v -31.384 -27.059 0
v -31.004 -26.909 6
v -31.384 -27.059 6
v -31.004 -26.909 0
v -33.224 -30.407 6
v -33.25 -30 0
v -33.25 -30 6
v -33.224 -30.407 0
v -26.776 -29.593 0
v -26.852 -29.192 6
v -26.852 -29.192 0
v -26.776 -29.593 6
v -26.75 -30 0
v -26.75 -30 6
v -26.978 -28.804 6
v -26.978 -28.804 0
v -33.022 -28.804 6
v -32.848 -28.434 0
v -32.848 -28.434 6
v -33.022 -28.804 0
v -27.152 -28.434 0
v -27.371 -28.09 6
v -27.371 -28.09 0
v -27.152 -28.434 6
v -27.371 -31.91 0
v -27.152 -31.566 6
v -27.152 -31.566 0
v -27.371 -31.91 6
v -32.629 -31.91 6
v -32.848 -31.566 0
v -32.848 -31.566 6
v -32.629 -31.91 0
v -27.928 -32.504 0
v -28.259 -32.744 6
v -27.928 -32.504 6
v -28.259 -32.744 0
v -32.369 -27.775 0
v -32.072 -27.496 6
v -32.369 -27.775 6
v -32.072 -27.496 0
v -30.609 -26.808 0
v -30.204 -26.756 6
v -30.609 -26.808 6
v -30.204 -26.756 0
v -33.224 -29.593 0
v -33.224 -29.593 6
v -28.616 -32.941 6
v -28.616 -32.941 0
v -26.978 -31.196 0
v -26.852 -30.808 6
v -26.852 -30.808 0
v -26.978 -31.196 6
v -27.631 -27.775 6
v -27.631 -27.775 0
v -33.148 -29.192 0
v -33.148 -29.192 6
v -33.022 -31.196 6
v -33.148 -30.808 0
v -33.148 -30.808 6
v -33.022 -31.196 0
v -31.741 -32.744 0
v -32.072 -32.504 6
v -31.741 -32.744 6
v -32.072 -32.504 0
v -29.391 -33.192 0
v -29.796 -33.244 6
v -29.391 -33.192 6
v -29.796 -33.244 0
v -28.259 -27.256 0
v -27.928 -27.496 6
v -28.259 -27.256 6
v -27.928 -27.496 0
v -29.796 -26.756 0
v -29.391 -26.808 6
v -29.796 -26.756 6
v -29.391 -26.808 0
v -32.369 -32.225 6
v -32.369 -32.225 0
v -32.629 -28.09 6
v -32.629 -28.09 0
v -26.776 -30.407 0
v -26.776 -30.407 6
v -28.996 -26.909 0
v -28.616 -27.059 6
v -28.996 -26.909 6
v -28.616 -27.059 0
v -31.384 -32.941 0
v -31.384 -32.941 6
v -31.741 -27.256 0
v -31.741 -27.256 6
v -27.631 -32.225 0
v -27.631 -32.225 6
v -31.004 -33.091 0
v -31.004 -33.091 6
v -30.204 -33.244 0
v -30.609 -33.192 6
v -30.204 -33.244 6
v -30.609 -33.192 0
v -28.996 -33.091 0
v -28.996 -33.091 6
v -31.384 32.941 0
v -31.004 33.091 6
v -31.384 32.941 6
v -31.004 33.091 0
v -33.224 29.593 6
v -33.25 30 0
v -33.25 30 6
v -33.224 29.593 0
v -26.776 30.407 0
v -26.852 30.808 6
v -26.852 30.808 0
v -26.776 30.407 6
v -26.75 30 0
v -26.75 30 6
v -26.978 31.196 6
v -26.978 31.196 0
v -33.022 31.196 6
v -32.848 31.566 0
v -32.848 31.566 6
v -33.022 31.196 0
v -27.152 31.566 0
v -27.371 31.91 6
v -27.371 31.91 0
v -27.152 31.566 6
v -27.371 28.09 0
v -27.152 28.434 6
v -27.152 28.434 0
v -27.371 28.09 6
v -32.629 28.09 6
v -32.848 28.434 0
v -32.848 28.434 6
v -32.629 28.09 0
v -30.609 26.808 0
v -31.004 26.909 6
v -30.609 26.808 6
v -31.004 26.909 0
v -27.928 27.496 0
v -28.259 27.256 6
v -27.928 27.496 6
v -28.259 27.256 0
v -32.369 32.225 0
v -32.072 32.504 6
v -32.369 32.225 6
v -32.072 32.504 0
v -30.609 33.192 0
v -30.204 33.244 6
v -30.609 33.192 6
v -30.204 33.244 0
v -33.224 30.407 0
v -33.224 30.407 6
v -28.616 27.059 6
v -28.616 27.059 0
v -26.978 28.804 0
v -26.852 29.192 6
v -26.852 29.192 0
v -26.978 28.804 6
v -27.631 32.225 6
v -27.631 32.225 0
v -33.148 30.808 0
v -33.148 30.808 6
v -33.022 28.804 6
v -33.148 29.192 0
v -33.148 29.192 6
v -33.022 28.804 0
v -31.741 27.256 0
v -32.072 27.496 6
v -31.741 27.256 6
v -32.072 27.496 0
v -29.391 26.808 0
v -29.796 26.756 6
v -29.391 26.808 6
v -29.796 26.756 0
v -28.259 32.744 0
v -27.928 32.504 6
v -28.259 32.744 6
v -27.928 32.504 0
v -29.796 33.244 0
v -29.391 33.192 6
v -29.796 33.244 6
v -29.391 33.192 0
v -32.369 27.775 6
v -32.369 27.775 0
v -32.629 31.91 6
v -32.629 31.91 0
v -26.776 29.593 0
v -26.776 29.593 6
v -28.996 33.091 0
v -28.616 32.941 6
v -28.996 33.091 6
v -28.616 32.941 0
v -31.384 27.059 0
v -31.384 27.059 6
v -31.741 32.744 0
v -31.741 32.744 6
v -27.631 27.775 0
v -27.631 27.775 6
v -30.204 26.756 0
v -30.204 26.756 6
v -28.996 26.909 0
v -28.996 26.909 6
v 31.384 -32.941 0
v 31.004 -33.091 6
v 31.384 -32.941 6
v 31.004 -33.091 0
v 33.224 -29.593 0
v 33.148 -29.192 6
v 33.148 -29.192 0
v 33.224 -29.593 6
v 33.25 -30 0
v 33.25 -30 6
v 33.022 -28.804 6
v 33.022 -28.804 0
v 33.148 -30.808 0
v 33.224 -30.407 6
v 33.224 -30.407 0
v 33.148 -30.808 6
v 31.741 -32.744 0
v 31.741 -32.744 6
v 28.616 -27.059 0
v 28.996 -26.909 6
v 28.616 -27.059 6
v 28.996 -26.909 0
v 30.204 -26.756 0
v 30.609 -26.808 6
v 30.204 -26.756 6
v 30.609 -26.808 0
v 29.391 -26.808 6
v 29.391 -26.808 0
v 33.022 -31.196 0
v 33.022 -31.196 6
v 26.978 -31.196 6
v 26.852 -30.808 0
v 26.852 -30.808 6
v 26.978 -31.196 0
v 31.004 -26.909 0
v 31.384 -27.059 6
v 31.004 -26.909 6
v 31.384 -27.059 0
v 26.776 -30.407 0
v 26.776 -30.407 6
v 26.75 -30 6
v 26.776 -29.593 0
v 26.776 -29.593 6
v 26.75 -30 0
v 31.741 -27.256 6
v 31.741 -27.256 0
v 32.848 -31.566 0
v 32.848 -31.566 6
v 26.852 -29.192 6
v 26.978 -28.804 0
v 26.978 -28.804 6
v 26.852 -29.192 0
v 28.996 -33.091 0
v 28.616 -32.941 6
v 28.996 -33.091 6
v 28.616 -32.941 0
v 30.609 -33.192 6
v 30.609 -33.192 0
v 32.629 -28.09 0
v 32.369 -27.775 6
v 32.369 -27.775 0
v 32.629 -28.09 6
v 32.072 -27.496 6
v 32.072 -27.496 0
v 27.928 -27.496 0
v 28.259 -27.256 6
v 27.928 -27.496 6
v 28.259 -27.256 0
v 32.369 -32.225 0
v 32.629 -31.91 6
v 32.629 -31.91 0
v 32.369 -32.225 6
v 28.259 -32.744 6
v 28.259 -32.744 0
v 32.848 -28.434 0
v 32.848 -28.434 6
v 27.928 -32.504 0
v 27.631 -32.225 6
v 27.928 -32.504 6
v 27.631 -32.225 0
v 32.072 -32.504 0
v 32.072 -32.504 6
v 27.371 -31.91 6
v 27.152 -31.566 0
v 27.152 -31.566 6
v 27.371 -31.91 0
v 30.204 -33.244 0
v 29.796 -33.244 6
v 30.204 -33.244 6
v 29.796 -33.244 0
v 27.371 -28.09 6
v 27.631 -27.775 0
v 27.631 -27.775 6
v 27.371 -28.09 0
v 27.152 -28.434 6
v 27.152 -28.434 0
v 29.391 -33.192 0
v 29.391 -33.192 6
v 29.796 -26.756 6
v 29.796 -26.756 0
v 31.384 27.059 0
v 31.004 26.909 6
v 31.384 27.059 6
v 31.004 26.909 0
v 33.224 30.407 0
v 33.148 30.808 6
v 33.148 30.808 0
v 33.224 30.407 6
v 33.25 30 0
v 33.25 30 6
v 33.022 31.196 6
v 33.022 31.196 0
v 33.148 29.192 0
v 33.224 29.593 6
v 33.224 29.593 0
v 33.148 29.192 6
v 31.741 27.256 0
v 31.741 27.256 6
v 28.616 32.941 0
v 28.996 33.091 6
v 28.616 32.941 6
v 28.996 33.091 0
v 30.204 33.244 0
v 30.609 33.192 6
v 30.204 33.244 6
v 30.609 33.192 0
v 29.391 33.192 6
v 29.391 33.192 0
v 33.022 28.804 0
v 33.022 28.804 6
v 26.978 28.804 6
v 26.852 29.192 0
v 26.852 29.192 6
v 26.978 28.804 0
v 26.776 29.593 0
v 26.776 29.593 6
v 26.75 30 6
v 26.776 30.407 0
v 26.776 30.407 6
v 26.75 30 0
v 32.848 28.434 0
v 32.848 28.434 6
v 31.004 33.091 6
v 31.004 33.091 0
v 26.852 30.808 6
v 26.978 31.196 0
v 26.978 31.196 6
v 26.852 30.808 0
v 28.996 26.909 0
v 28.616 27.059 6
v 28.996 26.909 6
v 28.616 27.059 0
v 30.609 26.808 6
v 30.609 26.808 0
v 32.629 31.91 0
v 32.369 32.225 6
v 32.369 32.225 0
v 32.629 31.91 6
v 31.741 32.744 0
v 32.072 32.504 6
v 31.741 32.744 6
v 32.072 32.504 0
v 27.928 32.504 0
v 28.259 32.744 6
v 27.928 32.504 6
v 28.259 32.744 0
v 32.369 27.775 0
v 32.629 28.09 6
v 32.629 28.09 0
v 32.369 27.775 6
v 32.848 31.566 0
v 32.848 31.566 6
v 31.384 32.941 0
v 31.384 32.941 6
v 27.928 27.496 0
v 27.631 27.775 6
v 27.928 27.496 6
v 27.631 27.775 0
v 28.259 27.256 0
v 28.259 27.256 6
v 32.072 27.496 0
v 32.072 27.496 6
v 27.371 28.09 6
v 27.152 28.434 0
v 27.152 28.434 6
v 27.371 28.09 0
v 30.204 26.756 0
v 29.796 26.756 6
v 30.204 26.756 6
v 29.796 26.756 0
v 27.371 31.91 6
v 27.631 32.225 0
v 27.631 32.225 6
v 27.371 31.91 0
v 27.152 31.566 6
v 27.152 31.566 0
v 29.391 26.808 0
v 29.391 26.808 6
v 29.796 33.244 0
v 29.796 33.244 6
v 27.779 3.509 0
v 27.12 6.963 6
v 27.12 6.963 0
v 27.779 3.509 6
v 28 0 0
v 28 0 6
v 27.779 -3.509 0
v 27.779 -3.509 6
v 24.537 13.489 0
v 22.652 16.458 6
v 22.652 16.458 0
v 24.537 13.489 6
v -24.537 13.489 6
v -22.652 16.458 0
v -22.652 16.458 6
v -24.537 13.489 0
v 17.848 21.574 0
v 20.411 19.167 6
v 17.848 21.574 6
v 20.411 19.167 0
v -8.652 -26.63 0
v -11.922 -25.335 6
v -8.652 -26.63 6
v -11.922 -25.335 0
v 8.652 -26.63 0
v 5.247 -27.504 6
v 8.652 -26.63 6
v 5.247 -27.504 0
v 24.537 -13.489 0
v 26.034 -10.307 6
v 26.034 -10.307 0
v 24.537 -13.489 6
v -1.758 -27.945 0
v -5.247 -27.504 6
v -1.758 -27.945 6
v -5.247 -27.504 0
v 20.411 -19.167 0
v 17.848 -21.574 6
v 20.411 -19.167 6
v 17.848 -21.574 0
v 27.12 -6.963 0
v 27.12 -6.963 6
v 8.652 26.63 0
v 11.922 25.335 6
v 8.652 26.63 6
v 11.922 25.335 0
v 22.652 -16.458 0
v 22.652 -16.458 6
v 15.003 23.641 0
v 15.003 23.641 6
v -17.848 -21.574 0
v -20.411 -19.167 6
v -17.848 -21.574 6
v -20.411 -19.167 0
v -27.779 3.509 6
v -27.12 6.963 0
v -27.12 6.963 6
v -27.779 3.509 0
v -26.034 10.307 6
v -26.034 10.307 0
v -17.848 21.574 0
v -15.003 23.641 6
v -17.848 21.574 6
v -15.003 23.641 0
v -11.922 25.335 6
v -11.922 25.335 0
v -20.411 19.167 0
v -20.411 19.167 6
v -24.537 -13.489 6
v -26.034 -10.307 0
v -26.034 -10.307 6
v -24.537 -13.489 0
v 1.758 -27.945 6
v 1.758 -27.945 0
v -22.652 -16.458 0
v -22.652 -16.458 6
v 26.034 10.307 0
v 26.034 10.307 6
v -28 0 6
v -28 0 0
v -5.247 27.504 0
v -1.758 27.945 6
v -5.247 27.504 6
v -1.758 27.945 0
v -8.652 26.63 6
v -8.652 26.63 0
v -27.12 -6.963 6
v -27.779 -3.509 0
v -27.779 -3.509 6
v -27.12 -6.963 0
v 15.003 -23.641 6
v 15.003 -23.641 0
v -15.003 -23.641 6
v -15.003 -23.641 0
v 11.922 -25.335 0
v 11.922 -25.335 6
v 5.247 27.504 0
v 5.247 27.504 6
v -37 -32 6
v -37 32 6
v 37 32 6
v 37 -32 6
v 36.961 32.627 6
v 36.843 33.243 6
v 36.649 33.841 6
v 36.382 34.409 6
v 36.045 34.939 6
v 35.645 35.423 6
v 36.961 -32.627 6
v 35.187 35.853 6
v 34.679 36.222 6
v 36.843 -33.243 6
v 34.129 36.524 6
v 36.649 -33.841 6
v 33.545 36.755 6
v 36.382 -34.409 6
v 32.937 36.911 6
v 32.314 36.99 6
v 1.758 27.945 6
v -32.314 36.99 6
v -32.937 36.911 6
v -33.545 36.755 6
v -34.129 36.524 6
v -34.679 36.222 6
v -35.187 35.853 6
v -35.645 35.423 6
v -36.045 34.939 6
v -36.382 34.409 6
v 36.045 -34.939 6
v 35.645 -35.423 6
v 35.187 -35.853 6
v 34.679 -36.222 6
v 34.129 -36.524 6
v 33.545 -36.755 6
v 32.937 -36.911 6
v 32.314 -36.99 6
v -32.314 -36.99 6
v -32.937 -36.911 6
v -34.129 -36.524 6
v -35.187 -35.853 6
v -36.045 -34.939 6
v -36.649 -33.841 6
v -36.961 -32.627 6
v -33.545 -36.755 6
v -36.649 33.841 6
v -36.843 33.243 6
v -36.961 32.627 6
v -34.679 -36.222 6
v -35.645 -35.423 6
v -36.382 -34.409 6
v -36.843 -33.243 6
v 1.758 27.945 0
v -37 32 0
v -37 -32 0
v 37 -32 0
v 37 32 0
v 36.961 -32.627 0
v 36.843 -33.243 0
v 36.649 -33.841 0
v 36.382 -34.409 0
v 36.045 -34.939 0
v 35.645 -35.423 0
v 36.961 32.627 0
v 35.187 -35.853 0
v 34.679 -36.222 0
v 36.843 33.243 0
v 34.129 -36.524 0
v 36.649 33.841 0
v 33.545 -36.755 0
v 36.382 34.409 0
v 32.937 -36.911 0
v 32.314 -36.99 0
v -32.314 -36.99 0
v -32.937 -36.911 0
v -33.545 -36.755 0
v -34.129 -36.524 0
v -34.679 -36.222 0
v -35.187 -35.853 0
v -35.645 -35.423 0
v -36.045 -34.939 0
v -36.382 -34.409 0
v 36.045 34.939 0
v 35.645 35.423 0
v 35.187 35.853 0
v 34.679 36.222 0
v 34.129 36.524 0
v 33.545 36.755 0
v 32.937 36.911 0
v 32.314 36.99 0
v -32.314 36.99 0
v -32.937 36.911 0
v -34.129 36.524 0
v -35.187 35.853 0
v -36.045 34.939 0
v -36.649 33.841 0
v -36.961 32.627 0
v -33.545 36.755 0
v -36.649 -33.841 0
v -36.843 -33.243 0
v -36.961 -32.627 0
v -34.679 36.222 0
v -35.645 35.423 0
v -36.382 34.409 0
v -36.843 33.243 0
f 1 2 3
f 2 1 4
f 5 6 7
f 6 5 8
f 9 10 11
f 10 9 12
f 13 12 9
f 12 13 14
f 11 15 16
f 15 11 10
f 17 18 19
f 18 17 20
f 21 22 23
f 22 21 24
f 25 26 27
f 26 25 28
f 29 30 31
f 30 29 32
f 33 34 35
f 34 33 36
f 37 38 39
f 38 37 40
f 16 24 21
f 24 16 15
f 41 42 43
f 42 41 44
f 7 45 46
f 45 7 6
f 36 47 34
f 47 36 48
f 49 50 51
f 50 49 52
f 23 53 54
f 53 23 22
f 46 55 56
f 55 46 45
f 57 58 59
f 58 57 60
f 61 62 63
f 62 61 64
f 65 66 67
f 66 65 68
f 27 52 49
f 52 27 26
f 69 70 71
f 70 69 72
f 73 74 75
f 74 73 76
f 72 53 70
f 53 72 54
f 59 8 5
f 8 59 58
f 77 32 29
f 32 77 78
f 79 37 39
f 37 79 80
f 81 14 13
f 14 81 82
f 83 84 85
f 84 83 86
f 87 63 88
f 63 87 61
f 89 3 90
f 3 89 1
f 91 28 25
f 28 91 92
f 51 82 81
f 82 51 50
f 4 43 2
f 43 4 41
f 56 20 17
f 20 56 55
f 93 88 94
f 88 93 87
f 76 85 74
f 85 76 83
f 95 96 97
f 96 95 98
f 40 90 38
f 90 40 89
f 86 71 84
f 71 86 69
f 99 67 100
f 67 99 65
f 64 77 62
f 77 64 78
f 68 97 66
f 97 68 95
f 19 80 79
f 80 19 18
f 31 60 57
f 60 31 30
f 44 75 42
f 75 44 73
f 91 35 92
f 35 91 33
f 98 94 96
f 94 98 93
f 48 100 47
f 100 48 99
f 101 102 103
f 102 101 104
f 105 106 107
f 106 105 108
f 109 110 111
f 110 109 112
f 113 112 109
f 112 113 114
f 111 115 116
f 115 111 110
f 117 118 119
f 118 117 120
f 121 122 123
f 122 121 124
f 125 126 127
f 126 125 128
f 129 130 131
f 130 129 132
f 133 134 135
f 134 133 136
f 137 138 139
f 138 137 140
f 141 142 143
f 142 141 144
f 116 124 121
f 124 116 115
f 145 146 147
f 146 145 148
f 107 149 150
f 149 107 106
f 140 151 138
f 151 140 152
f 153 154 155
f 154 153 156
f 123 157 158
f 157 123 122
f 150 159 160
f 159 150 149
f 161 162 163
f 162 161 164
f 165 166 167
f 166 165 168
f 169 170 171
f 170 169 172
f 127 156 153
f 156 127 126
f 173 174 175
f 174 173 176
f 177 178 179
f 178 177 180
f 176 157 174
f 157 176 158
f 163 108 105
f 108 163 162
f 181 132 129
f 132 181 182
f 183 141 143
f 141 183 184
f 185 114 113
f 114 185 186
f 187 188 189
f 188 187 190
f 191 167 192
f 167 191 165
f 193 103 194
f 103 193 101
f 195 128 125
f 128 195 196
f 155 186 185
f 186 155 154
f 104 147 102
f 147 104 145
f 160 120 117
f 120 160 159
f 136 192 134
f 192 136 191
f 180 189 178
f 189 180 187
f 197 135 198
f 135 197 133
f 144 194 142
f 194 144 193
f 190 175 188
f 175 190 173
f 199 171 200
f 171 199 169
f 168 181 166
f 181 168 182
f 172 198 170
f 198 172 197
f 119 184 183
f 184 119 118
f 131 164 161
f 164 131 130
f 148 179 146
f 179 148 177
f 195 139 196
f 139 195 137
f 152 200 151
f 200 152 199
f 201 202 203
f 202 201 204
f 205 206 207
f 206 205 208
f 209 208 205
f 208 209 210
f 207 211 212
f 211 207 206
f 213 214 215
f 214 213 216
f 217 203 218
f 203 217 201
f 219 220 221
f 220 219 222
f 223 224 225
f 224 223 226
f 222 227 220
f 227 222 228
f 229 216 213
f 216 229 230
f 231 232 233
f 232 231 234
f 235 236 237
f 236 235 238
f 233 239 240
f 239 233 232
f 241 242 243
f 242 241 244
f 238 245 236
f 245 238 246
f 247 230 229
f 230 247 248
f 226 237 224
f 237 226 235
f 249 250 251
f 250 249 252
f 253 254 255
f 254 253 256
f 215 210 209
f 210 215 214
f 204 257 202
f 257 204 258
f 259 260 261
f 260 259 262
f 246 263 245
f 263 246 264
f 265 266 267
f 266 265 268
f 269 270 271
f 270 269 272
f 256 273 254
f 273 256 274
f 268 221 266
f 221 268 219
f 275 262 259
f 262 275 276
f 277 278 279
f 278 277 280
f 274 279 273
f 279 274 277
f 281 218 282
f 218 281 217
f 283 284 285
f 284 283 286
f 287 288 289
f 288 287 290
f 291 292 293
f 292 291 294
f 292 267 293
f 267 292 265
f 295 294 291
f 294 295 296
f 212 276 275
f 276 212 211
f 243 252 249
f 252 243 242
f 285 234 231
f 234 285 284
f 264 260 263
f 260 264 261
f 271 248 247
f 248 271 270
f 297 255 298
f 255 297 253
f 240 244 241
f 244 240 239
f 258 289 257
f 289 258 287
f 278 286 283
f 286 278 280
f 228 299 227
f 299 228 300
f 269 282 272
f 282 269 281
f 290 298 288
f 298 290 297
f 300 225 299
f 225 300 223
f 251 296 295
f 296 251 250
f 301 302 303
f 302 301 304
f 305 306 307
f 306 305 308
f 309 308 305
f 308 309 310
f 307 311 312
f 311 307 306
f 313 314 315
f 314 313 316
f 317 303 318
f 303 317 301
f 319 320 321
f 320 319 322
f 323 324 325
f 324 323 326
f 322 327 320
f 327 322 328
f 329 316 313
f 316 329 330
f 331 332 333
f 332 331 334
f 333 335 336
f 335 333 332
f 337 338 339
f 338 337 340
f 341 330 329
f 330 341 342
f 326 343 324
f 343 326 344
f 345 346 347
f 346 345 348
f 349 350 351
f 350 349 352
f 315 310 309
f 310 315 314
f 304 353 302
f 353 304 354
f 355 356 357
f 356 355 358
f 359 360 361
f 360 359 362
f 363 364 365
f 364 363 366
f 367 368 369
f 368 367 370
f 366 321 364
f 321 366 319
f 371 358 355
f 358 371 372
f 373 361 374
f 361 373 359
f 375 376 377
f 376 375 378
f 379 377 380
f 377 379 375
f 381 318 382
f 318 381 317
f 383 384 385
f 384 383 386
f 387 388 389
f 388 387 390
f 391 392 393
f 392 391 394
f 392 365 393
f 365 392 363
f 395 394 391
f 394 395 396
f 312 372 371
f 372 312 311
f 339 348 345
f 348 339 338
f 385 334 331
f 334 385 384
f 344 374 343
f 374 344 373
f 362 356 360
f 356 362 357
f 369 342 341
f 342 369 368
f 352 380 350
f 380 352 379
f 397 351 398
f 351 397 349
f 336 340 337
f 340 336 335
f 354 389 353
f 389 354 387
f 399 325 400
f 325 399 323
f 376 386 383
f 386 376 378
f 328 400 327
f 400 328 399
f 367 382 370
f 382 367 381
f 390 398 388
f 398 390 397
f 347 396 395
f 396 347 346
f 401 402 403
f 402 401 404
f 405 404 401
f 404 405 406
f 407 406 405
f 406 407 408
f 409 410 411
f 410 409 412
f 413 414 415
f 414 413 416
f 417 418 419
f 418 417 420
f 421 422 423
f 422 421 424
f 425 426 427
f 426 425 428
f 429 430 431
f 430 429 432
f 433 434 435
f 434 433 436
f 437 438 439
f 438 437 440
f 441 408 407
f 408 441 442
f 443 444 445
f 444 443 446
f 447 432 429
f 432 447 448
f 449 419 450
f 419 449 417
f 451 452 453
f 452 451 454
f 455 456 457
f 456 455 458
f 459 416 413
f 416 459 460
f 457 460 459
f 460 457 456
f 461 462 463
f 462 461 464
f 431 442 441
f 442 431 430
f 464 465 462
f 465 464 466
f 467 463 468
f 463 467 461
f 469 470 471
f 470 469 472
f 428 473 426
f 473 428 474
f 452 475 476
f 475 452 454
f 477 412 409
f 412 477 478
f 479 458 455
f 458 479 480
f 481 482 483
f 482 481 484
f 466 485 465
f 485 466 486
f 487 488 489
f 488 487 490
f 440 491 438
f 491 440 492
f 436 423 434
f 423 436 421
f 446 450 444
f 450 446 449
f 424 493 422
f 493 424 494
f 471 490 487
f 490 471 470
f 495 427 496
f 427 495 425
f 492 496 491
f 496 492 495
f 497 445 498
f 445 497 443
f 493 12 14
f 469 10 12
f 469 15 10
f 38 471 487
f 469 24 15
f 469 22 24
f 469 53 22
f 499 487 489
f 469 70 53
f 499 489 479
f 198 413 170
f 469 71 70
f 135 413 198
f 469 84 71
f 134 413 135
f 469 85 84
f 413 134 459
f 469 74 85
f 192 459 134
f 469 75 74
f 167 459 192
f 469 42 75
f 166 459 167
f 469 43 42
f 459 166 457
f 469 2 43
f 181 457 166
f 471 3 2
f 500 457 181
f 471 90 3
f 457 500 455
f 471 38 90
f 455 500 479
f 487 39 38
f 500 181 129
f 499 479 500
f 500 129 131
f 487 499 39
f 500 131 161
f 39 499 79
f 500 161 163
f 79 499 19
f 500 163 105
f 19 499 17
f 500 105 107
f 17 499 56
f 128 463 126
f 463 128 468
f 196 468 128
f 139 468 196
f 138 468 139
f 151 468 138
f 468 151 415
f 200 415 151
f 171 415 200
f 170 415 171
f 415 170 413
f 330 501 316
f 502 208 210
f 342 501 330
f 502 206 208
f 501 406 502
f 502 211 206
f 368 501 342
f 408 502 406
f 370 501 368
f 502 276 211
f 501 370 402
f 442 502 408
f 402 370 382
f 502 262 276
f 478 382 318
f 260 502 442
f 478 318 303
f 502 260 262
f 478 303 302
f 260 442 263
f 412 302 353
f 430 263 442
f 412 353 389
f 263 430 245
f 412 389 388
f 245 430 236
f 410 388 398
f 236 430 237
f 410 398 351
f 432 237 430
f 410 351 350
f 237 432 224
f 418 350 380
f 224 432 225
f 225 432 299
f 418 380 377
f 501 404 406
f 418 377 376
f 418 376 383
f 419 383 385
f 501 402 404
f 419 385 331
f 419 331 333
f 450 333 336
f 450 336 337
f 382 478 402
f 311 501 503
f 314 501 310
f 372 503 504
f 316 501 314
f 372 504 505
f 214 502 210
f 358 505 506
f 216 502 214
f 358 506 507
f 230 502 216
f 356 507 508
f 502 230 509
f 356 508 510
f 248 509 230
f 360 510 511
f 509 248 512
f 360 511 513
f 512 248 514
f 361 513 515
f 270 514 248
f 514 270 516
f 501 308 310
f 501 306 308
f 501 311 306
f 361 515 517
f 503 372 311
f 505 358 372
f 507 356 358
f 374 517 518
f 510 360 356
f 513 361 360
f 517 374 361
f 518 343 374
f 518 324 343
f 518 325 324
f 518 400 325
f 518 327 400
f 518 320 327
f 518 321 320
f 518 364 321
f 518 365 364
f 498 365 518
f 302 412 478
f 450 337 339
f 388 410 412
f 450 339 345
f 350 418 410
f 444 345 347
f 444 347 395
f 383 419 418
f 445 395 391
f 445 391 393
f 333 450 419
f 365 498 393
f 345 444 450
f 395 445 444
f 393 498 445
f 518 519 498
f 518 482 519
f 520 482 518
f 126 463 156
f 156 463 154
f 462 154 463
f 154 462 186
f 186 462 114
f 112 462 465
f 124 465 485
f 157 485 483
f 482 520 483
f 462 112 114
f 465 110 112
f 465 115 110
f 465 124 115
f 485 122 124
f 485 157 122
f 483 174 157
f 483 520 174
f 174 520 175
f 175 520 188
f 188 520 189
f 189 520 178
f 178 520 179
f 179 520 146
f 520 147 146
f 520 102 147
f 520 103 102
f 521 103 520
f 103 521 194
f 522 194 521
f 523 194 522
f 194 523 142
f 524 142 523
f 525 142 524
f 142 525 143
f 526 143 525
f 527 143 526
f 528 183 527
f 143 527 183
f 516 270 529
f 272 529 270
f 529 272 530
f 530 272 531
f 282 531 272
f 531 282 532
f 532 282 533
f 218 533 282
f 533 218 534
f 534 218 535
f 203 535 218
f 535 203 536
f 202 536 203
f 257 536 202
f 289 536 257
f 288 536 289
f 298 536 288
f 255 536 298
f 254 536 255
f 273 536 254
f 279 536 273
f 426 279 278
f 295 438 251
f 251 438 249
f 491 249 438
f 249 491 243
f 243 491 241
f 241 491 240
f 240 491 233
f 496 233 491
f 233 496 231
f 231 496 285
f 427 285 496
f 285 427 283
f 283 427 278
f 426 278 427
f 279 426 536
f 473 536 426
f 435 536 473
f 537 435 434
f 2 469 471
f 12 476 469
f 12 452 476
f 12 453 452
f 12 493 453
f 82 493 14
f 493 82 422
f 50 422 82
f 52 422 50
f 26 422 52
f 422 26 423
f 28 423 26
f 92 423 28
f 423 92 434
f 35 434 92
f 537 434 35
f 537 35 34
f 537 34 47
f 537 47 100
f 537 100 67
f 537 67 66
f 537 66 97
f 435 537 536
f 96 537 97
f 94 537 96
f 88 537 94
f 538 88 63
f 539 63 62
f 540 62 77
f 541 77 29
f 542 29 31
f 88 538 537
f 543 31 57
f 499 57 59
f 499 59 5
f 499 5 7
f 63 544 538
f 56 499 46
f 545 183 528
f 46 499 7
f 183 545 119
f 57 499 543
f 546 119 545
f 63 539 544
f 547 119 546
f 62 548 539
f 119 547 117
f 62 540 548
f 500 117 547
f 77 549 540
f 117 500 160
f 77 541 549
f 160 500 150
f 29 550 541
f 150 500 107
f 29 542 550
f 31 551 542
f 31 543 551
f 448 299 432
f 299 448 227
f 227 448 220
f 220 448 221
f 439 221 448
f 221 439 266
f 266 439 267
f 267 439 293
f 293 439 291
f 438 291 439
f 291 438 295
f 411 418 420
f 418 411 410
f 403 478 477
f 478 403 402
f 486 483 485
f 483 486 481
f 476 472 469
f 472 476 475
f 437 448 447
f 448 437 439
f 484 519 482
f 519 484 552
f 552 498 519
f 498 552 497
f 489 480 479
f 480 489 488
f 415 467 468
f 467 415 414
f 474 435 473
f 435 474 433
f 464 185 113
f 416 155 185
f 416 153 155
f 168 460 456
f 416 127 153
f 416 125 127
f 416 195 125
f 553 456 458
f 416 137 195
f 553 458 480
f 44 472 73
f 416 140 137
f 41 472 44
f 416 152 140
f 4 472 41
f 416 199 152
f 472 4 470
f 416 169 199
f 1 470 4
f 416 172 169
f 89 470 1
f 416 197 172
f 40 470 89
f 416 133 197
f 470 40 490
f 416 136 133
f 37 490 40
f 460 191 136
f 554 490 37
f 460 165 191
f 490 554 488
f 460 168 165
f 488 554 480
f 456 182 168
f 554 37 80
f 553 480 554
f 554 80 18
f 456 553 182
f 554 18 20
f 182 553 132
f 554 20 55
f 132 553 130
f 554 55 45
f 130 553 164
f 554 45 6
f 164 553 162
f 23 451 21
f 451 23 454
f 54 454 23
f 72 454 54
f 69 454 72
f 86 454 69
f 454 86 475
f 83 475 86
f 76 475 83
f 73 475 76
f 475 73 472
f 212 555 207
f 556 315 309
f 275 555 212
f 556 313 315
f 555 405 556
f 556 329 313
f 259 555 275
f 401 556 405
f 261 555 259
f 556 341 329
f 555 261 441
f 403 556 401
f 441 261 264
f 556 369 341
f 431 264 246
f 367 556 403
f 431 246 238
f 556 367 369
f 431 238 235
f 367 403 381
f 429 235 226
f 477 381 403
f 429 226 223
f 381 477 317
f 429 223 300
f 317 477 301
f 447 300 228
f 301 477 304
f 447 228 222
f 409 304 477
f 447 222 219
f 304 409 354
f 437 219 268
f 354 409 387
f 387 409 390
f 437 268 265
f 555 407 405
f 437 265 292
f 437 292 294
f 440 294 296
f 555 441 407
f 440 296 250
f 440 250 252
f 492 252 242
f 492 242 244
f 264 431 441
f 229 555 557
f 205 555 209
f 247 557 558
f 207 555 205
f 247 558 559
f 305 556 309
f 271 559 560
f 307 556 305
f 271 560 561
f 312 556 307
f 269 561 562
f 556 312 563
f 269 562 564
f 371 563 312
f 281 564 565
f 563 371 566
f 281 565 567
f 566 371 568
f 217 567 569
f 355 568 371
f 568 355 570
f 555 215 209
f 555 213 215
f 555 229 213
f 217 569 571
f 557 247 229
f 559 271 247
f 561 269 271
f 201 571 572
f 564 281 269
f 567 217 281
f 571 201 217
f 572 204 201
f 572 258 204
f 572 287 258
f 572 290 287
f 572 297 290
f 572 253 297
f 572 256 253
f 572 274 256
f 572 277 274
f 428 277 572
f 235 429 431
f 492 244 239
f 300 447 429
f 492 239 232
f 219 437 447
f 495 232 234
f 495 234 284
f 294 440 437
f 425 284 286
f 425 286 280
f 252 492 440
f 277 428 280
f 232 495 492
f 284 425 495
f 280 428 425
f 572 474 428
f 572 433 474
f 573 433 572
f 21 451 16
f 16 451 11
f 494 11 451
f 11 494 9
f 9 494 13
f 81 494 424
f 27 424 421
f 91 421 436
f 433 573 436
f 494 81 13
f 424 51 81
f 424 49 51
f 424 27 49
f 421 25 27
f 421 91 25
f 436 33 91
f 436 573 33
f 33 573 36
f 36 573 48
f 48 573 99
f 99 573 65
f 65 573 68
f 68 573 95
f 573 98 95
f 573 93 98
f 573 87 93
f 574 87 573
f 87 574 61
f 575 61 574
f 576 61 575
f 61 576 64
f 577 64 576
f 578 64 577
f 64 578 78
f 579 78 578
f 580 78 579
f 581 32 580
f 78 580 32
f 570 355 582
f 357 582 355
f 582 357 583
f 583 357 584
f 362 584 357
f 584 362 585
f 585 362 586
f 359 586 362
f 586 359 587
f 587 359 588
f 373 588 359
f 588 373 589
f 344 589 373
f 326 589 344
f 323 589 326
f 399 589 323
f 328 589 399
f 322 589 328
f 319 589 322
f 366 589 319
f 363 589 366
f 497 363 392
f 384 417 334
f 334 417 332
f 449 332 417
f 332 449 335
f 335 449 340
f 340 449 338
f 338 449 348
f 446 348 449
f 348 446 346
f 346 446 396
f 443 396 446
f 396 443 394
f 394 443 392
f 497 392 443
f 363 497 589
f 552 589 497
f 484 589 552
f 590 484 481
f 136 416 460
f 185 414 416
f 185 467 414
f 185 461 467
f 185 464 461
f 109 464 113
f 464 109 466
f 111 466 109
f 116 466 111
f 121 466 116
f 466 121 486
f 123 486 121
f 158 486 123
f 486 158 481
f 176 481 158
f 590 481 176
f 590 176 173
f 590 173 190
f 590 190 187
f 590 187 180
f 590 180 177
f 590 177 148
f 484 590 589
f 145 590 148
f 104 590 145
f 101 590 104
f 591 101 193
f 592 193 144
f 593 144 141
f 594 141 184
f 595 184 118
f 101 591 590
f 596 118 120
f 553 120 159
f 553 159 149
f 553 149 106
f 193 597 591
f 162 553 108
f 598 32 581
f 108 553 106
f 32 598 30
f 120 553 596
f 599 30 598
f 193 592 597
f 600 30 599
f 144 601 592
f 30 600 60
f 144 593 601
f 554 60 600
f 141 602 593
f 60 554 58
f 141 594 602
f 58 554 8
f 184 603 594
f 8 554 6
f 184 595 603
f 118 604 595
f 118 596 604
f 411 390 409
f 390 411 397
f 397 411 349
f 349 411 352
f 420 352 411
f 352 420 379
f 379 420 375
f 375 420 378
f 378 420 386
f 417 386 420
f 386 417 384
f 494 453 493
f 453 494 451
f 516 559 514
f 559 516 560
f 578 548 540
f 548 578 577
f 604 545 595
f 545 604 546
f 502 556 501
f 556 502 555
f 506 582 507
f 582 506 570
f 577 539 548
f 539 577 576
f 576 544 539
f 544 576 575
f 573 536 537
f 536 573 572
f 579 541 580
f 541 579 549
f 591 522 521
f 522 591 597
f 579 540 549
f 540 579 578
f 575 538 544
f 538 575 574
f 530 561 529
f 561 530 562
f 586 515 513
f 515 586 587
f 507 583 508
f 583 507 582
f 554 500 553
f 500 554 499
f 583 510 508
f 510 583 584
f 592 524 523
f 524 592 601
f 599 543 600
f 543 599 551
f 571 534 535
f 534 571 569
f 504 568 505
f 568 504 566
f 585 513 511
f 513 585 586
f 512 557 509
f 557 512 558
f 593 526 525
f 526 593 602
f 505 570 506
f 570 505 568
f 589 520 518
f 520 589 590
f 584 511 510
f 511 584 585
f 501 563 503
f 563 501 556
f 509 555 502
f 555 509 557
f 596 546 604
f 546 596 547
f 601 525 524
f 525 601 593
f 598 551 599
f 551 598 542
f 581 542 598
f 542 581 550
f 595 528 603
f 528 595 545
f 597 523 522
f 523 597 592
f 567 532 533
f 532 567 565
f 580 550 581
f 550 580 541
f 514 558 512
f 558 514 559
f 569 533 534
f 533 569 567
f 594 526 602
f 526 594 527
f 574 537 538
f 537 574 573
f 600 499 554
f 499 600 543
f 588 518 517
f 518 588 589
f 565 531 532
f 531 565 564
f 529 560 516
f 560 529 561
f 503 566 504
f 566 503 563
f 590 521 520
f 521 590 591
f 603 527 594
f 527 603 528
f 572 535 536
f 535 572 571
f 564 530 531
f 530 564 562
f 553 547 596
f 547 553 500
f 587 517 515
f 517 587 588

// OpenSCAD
$fn = 50;

difference() {
	union() {
		hull() {
			translate(v = [-32.0, 32.0, 0]) {
				cylinder(h = 6, r = 5);
			}
			translate(v = [32.0, 32.0, 0]) {
				cylinder(h = 6, r = 5);
			}
			translate(v = [-32.0, -32.0, 0]) {
				cylinder(h = 6, r = 5);
			}
			translate(v = [32.0, -32.0, 0]) {
				cylinder(h = 6, r = 5);
			}
		}
	}
	union() {
		translate(v = [-30.0, -30.0, -100.0]) {
			cylinder(h = 200, r = 3.25);
		}
		translate(v = [-30.0, 30.0, -100.0]) {
			cylinder(h = 200, r = 3.25);
		}
		translate(v = [30.0, -30.0, -100.0]) {
			cylinder(h = 200, r = 3.25);
		}
		translate(v = [30.0, 30.0, -100.0]) {
			cylinder(h = 200, r = 3.25);
		}
		translate(v = [-30.0, -30.0, -100.0]) {
			cylinder(h = 200, r = 1.8);
		}
		translate(v = [-30.0, 30.0, -100.0]) {
			cylinder(h = 200, r = 1.8);
		}
		translate(v = [30.0, -30.0, -100.0]) {
			cylinder(h = 200, r = 1.8);
		}
		translate(v = [30.0, 30.0, -100.0]) {
			cylinder(h = 200, r = 1.8);
		}
		cylinder(h = 6, r = 28.0);
	}
}
